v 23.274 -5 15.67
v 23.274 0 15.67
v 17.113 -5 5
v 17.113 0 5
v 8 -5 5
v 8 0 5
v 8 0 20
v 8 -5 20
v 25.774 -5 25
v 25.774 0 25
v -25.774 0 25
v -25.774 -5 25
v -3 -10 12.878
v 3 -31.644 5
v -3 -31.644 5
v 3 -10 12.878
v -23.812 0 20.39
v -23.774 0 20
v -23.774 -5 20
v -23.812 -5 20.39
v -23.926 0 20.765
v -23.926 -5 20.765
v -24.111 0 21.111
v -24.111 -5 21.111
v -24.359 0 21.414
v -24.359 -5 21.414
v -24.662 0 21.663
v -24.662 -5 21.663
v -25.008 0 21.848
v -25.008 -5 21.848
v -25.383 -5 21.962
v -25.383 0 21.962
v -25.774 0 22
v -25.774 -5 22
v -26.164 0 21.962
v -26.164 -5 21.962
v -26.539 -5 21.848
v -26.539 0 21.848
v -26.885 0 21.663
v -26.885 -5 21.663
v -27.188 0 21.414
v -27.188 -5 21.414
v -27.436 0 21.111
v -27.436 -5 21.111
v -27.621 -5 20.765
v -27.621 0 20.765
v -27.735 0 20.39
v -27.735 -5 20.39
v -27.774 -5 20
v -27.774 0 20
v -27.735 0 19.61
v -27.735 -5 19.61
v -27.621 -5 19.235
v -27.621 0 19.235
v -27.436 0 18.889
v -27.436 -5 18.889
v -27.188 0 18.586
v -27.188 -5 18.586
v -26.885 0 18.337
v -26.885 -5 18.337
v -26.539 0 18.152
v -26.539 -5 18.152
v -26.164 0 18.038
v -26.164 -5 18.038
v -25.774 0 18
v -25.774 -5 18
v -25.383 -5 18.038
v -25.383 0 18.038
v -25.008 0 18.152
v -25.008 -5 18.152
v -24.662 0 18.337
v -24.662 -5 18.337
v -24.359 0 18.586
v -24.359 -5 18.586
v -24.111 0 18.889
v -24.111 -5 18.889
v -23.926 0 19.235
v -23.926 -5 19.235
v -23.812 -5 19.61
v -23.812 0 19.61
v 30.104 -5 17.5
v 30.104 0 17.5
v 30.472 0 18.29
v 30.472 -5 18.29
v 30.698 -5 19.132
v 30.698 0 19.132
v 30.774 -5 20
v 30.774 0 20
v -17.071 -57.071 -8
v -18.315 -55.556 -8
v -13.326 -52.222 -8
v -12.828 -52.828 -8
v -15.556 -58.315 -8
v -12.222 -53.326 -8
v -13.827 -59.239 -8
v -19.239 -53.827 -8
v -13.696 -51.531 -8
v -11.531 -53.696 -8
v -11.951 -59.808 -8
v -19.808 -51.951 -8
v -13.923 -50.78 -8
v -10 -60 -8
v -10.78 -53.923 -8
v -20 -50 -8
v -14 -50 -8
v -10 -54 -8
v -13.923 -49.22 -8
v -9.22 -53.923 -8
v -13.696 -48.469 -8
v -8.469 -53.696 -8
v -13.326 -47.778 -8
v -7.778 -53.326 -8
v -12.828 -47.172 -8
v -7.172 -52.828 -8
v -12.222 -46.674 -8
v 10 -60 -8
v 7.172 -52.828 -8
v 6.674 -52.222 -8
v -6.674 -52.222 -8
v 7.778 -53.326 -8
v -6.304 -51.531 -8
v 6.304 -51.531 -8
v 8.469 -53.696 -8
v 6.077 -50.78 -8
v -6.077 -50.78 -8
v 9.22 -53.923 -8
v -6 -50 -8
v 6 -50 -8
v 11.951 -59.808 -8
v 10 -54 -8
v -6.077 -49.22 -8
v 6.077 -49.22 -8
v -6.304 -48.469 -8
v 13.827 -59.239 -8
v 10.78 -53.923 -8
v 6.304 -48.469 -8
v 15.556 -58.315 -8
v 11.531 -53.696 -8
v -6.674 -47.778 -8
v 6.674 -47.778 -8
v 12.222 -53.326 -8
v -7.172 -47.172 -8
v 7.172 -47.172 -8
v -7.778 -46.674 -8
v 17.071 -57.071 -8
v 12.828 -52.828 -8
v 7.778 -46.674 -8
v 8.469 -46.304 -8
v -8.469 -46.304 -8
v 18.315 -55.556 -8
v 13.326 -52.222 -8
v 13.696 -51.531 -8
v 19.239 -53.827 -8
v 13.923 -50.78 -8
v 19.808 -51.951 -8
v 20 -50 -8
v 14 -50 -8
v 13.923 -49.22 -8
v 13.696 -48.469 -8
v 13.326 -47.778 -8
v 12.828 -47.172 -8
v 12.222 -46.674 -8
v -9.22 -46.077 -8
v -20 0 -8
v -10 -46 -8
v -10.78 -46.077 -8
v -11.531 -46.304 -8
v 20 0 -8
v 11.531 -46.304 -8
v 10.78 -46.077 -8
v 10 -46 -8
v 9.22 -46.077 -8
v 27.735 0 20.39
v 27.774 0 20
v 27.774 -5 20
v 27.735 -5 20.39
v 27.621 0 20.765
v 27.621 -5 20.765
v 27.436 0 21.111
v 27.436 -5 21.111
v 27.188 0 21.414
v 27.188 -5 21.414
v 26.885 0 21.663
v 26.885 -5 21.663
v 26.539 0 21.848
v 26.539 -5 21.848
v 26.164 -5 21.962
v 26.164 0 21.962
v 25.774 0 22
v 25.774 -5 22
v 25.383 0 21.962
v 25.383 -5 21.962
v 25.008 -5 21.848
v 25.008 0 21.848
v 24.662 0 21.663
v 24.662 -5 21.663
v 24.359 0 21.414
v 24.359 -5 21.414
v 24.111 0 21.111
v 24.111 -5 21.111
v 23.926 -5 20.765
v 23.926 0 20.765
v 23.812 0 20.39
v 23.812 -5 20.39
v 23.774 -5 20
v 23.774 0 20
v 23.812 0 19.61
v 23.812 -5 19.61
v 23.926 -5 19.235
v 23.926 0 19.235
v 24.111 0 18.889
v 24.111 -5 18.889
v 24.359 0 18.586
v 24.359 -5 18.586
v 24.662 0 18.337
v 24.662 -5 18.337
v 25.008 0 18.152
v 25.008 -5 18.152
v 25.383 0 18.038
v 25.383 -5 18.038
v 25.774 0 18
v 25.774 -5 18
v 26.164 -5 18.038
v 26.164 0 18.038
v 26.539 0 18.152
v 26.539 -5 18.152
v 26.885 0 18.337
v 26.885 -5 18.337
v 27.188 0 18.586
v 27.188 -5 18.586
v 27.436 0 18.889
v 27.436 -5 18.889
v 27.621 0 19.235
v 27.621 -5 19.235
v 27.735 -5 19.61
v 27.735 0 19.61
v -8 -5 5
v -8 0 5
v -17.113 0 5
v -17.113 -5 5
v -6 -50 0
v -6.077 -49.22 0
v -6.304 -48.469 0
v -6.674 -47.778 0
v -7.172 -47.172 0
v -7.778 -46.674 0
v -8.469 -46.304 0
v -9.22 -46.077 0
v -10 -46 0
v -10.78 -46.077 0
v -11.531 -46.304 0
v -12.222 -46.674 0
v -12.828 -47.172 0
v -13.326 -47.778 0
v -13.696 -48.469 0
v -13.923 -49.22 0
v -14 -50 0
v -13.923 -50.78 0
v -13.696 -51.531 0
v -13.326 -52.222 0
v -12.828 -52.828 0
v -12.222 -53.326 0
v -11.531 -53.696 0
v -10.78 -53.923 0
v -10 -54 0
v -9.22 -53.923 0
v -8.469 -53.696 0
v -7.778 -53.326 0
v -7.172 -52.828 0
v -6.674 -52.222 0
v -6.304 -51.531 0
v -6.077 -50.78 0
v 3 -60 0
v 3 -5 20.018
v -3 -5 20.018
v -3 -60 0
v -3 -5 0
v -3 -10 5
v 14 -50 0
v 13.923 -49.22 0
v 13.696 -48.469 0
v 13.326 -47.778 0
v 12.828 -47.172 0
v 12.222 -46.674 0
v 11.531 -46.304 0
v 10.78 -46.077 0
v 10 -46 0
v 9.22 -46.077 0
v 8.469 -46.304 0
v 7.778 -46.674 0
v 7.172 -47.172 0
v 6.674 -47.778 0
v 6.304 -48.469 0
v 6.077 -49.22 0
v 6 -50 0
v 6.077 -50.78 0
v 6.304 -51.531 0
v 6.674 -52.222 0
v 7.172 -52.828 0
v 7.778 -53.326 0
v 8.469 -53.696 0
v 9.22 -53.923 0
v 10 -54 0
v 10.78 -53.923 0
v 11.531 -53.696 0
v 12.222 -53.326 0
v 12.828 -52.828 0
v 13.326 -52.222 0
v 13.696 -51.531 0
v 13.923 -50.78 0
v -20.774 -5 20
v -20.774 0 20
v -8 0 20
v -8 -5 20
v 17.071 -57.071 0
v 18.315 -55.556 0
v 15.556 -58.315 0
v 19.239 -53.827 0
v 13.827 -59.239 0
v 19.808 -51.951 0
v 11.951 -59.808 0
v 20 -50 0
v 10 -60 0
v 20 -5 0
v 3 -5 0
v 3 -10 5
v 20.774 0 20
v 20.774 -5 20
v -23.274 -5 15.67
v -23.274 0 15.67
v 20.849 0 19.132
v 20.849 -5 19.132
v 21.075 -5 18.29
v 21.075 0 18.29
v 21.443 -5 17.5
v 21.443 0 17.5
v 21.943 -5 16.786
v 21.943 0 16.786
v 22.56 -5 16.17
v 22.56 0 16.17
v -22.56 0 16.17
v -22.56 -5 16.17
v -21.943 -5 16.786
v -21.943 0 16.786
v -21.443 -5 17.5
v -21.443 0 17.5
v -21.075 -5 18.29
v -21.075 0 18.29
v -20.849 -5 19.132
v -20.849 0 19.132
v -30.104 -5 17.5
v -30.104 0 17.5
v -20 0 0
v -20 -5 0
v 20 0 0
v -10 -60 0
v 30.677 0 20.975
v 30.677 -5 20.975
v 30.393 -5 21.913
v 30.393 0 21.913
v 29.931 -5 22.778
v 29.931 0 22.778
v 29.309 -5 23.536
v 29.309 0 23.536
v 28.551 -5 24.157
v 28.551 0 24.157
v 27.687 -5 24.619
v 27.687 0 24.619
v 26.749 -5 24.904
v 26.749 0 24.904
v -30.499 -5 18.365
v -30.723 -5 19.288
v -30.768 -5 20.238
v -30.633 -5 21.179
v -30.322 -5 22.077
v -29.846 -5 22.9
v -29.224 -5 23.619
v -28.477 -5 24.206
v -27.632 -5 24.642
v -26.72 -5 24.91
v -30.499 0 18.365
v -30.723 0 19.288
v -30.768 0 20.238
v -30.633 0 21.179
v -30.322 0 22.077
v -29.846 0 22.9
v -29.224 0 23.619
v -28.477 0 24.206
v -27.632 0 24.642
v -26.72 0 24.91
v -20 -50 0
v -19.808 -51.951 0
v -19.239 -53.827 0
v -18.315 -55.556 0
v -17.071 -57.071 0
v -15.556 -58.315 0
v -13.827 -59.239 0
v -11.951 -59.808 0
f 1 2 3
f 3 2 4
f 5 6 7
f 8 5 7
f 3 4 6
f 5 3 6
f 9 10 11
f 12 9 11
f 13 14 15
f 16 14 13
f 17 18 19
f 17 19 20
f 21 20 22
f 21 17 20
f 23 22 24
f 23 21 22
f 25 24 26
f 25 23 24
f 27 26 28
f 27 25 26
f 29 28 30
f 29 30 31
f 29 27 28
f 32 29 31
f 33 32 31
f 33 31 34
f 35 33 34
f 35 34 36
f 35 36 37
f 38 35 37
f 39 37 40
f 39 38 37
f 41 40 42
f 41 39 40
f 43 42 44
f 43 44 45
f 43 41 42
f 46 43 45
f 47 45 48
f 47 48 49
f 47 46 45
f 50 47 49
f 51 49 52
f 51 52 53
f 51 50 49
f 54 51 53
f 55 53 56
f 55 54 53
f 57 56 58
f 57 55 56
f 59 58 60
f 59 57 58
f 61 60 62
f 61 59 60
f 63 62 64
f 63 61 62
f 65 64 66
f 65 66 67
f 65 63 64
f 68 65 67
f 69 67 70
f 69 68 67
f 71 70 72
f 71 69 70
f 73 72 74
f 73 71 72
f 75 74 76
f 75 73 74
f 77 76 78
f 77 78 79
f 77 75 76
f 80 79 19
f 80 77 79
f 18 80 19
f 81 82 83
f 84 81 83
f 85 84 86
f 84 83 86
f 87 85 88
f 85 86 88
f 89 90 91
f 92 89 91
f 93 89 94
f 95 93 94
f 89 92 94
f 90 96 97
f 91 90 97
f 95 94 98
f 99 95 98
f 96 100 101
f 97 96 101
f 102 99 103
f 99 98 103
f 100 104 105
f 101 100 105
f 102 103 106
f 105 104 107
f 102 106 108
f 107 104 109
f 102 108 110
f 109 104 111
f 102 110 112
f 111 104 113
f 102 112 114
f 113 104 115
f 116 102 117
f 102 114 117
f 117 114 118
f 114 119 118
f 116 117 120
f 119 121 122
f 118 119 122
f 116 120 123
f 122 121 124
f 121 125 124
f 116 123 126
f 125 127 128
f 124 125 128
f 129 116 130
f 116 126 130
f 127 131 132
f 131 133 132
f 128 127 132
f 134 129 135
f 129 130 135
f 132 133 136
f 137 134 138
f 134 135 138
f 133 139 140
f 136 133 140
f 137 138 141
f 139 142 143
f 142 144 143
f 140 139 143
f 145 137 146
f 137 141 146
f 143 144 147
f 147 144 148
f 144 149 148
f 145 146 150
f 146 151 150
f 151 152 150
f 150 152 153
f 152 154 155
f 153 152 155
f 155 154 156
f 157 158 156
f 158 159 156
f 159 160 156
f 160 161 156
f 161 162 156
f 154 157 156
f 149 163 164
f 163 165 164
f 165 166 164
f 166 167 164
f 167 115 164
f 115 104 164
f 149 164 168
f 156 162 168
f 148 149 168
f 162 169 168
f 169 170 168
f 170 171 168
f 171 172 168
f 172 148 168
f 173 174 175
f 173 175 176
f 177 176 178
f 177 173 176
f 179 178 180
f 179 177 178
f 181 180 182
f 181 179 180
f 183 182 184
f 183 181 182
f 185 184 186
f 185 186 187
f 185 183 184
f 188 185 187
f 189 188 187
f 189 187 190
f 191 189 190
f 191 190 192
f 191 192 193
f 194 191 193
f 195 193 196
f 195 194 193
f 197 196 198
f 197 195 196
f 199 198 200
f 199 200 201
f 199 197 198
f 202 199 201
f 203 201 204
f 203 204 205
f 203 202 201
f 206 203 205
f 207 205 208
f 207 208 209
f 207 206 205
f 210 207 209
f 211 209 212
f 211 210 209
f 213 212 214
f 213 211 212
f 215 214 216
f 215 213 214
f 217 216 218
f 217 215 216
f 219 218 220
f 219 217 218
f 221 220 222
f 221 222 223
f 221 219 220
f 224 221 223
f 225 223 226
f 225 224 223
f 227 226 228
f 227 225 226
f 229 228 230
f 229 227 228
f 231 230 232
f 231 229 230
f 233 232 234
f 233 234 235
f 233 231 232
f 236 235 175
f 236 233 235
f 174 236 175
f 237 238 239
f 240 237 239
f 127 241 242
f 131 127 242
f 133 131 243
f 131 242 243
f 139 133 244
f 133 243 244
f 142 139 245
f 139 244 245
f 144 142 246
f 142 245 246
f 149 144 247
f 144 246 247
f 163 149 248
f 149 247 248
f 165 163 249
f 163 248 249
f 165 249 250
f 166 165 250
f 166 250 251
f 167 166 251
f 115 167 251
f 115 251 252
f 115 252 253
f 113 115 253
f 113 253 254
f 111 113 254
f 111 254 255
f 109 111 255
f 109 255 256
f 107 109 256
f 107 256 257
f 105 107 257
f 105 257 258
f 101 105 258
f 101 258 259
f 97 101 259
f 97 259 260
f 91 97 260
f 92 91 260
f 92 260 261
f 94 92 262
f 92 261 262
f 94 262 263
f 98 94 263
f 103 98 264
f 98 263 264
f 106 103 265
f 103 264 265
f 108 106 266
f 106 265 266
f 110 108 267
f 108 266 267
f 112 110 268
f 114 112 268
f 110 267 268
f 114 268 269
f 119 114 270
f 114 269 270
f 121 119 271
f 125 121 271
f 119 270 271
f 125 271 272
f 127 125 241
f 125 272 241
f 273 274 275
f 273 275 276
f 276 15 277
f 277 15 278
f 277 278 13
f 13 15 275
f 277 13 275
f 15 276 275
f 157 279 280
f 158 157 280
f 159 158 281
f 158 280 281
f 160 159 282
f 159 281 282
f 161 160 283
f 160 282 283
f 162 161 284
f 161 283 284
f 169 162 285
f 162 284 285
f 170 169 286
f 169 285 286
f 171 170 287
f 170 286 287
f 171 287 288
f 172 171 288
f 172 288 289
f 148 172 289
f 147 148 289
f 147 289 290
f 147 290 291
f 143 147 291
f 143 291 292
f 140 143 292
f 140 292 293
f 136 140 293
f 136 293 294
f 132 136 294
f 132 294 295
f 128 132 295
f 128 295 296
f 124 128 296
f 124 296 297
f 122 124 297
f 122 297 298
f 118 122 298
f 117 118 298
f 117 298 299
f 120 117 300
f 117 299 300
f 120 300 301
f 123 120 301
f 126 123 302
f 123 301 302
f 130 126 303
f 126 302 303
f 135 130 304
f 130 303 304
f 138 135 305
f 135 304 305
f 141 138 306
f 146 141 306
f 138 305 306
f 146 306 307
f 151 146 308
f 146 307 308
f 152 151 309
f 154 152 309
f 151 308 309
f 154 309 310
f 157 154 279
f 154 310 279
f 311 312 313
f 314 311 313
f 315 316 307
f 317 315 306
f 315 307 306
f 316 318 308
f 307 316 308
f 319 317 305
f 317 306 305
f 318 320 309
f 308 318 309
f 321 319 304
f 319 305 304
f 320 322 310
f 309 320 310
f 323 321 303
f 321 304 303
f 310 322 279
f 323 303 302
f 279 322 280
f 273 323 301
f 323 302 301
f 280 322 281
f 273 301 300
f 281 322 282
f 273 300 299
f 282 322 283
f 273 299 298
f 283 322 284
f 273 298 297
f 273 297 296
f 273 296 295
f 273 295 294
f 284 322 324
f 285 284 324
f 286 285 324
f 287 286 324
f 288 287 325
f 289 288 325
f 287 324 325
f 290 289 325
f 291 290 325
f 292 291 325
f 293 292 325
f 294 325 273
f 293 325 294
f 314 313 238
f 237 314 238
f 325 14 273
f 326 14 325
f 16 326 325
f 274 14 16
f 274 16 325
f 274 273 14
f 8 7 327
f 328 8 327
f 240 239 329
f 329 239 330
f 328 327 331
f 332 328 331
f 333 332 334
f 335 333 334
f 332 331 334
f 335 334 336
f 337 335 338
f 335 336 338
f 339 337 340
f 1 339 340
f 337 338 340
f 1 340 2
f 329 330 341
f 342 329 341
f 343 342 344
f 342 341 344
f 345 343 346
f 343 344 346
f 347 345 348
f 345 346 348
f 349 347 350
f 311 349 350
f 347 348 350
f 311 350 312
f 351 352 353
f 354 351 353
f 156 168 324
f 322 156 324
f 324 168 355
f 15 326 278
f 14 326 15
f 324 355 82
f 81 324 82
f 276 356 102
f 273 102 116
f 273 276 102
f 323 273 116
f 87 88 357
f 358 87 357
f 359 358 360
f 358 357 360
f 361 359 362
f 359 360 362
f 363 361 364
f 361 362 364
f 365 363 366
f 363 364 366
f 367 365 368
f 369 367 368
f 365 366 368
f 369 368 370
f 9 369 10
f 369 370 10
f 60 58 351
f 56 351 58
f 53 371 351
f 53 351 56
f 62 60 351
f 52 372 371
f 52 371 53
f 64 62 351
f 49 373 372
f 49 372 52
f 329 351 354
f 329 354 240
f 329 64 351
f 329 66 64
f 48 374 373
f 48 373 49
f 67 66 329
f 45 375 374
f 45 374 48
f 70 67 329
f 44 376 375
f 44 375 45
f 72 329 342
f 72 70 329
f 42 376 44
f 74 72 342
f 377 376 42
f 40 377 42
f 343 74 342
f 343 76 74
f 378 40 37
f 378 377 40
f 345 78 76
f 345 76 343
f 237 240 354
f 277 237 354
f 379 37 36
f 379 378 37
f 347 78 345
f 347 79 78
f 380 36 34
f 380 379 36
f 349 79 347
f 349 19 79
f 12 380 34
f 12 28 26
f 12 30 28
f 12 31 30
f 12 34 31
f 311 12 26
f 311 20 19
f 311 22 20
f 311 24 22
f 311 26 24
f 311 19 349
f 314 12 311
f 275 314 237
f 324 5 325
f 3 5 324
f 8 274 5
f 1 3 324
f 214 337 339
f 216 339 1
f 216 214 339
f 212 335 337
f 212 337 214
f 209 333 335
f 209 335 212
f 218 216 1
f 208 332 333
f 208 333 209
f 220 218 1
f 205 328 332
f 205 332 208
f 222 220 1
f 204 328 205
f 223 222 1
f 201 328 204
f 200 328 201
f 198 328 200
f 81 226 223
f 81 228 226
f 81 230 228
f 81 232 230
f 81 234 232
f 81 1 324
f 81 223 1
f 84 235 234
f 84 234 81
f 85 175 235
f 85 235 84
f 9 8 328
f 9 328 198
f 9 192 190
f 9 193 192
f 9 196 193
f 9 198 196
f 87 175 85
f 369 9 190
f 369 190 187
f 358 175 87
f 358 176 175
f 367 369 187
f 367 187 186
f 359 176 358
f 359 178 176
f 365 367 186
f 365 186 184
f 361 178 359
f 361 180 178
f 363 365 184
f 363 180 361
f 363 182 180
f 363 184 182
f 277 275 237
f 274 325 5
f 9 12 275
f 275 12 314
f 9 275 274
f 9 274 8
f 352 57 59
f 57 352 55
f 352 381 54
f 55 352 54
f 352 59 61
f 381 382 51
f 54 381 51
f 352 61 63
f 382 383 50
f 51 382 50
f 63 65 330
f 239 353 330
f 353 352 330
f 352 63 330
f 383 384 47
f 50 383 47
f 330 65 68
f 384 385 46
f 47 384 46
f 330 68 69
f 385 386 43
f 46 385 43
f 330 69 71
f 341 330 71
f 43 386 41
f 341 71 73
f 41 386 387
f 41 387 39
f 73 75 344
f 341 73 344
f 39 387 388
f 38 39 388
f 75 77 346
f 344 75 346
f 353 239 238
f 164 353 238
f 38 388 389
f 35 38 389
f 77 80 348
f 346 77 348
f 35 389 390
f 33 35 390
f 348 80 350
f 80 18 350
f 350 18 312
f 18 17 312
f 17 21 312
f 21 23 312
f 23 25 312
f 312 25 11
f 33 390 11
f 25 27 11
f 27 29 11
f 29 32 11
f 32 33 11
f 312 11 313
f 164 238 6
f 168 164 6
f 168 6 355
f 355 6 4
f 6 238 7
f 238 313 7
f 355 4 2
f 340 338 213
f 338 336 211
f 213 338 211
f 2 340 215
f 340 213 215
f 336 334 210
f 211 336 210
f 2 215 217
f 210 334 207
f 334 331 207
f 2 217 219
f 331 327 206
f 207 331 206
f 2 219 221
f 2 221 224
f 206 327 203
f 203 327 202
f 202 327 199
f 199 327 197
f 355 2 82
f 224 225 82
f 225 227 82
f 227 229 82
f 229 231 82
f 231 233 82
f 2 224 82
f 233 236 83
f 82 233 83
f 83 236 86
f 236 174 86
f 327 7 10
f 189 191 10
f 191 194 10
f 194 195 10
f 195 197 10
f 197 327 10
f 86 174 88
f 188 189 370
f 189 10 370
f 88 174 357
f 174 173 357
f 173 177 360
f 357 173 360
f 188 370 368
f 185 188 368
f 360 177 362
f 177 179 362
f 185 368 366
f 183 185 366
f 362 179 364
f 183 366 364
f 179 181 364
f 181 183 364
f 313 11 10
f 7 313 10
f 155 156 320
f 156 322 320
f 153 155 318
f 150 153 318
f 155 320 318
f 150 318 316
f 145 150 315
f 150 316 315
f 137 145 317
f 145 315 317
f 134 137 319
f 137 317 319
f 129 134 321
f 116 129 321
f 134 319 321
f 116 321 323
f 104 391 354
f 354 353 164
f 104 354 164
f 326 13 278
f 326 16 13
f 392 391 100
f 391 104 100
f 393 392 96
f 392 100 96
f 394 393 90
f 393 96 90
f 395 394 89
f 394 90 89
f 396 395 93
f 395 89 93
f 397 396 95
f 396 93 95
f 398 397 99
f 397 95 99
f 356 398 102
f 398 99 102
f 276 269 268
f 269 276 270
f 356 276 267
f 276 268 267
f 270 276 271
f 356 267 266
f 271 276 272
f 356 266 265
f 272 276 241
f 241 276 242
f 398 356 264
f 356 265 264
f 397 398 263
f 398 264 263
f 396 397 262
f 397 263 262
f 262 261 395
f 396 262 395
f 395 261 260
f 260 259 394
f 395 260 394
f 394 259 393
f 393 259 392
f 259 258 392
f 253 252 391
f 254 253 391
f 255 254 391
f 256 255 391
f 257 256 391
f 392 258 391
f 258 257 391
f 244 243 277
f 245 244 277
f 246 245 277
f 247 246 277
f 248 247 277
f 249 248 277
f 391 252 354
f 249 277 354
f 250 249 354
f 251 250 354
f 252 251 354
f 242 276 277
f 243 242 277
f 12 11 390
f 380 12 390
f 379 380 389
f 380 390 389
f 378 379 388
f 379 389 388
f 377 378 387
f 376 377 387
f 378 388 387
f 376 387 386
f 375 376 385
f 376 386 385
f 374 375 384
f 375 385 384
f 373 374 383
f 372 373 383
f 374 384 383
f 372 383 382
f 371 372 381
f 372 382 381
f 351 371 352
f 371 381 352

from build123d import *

# Parameters (mm, degrees)
F0_R     = 2
F1_DEPTH = 5
F2_DEPTH = 60
F4_DEPTH = 3
F5_R     = 4
F6_DEPTH = 8.001
F7_R     = 10


with BuildPart() as f1:
    # F0 (on Front) → F1 (new body)
    with BuildSketch(Plane.XZ):
        with BuildLine():
            Line((-20, 0), (-3, 0))
            Line((-3, 0), (-3, 20))
            Line((-3, 20), (0, 20))
            Line((0, 20), (3, 20))
            Line((3, 20), (3, 0))
            Line((3, 0), (20, 0))
            Line((20, 0), (30.1036297108, 17.5))
            ThreePointArc((30.1036297108, 17.5), (27.0675979174, 15.1703708686), (23.2735026919, 15.6698729811))
            Line((23.2735026919, 15.6698729811), (17.1132486541, 5))
            Line((17.1132486541, 5), (8, 5))
            Line((8, 5), (8, 20))
            Line((8, 20), (20.7735026919, 20))
            ThreePointArc((20.7735026919, 20), (22.237968786, 23.5355339059), (25.7735026919, 25))
            Line((25.7735026919, 25), (0, 25))
            Line((0, 25), (-25.7735026919, 25))
            ThreePointArc((-25.7735026919, 25), (-22.237968786, 23.5355339059), (-20.7735026919, 20))
            Line((-20.7735026919, 20), (-8, 20))
            Line((-8, 20), (-8, 5))
            Line((-8, 5), (-17.1132486541, 5))
            Line((-17.1132486541, 5), (-23.2735026919, 15.6698729811))
            ThreePointArc((-23.2735026919, 15.6698729811), (-27.0675979174, 15.1703708686), (-30.1036297108, 17.5))
            Line((-30.1036297108, 17.5), (-20, 0))
        make_face()
        with BuildLine():
            ThreePointArc((-25.7735026919, 25), (-30.1036297108, 22.5), (-30.1036297108, 17.5))
            ThreePointArc((-30.1036297108, 17.5), (-27.0675979174, 15.1703708686), (-23.2735026919, 15.6698729811))
            ThreePointArc((-23.2735026919, 15.6698729811), (-21.443375673, 17.5), (-20.7735026919, 20))
            ThreePointArc((-20.7735026919, 20), (-22.237968786, 23.5355339059), (-25.7735026919, 25))
        make_face()
        with Locations((-25.7735026919, 20)):
            Circle(F0_R, mode=Mode.SUBTRACT)
        with BuildLine():
            ThreePointArc((23.2735026919, 15.6698729811), (27.0675979174, 15.1703708686), (30.1036297108, 17.5))
            ThreePointArc((30.1036297108, 17.5), (30.6031318233, 18.7059047745), (30.7735026919, 20))
            ThreePointArc((30.7735026919, 20), (29.3090365978, 23.5355339059), (25.7735026919, 25))
            ThreePointArc((25.7735026919, 25), (22.237968786, 23.5355339059), (20.7735026919, 20))
            ThreePointArc((20.7735026919, 20), (21.443375673, 17.5), (23.2735026919, 15.6698729811))
        make_face()
        with Locations((25.7735026919, 20)):
            Circle(F0_R, mode=Mode.SUBTRACT)
    extrude(amount=F1_DEPTH)



with BuildPart() as f2:
    # F0 (on Front) → F2 (new body)
    with BuildSketch(Plane.XZ):
        Polygon((3, 0), (0, 0), (0, -8), (20, -8), (20, 0), align=None)
        Polygon((0, -8), (0, 0), (-3, 0), (-20, 0), (-20, -8), align=None)
    extrude(amount=F2_DEPTH)


with BuildPart() as f1_1:
    add(f1.part)

    add(f2.part)  # F4 merges F2
    # F3 (on Right) → F4 (join, symmetric)
    with BuildSketch(Plane.YZ):
        Polygon((0, 21.838214056), (-60, 0), (0, 0), align=None)
        Polygon((-31.6435909019, 5), (-10, 12.8776228509), (-10, 5), align=None, mode=Mode.SUBTRACT)
    extrude(amount=F4_DEPTH, both=True)

    # F5 (on Top) → F6 (cut, through all)
    with BuildSketch(Plane.XY):
        with Locations((-10, -50)):
            Circle(F5_R)
        with Locations((10, -50)):
            Circle(F5_R)
    extrude(amount=-F6_DEPTH, mode=Mode.SUBTRACT)

    # F7
    f7_edges = [f1_1.edges().sort_by_distance(p)[0] for p in [
        (-20, -60, -4),
        (20, -60, -4),
    ]]
    fillet(f7_edges, radius=F7_R)


solid = f1_1.part
